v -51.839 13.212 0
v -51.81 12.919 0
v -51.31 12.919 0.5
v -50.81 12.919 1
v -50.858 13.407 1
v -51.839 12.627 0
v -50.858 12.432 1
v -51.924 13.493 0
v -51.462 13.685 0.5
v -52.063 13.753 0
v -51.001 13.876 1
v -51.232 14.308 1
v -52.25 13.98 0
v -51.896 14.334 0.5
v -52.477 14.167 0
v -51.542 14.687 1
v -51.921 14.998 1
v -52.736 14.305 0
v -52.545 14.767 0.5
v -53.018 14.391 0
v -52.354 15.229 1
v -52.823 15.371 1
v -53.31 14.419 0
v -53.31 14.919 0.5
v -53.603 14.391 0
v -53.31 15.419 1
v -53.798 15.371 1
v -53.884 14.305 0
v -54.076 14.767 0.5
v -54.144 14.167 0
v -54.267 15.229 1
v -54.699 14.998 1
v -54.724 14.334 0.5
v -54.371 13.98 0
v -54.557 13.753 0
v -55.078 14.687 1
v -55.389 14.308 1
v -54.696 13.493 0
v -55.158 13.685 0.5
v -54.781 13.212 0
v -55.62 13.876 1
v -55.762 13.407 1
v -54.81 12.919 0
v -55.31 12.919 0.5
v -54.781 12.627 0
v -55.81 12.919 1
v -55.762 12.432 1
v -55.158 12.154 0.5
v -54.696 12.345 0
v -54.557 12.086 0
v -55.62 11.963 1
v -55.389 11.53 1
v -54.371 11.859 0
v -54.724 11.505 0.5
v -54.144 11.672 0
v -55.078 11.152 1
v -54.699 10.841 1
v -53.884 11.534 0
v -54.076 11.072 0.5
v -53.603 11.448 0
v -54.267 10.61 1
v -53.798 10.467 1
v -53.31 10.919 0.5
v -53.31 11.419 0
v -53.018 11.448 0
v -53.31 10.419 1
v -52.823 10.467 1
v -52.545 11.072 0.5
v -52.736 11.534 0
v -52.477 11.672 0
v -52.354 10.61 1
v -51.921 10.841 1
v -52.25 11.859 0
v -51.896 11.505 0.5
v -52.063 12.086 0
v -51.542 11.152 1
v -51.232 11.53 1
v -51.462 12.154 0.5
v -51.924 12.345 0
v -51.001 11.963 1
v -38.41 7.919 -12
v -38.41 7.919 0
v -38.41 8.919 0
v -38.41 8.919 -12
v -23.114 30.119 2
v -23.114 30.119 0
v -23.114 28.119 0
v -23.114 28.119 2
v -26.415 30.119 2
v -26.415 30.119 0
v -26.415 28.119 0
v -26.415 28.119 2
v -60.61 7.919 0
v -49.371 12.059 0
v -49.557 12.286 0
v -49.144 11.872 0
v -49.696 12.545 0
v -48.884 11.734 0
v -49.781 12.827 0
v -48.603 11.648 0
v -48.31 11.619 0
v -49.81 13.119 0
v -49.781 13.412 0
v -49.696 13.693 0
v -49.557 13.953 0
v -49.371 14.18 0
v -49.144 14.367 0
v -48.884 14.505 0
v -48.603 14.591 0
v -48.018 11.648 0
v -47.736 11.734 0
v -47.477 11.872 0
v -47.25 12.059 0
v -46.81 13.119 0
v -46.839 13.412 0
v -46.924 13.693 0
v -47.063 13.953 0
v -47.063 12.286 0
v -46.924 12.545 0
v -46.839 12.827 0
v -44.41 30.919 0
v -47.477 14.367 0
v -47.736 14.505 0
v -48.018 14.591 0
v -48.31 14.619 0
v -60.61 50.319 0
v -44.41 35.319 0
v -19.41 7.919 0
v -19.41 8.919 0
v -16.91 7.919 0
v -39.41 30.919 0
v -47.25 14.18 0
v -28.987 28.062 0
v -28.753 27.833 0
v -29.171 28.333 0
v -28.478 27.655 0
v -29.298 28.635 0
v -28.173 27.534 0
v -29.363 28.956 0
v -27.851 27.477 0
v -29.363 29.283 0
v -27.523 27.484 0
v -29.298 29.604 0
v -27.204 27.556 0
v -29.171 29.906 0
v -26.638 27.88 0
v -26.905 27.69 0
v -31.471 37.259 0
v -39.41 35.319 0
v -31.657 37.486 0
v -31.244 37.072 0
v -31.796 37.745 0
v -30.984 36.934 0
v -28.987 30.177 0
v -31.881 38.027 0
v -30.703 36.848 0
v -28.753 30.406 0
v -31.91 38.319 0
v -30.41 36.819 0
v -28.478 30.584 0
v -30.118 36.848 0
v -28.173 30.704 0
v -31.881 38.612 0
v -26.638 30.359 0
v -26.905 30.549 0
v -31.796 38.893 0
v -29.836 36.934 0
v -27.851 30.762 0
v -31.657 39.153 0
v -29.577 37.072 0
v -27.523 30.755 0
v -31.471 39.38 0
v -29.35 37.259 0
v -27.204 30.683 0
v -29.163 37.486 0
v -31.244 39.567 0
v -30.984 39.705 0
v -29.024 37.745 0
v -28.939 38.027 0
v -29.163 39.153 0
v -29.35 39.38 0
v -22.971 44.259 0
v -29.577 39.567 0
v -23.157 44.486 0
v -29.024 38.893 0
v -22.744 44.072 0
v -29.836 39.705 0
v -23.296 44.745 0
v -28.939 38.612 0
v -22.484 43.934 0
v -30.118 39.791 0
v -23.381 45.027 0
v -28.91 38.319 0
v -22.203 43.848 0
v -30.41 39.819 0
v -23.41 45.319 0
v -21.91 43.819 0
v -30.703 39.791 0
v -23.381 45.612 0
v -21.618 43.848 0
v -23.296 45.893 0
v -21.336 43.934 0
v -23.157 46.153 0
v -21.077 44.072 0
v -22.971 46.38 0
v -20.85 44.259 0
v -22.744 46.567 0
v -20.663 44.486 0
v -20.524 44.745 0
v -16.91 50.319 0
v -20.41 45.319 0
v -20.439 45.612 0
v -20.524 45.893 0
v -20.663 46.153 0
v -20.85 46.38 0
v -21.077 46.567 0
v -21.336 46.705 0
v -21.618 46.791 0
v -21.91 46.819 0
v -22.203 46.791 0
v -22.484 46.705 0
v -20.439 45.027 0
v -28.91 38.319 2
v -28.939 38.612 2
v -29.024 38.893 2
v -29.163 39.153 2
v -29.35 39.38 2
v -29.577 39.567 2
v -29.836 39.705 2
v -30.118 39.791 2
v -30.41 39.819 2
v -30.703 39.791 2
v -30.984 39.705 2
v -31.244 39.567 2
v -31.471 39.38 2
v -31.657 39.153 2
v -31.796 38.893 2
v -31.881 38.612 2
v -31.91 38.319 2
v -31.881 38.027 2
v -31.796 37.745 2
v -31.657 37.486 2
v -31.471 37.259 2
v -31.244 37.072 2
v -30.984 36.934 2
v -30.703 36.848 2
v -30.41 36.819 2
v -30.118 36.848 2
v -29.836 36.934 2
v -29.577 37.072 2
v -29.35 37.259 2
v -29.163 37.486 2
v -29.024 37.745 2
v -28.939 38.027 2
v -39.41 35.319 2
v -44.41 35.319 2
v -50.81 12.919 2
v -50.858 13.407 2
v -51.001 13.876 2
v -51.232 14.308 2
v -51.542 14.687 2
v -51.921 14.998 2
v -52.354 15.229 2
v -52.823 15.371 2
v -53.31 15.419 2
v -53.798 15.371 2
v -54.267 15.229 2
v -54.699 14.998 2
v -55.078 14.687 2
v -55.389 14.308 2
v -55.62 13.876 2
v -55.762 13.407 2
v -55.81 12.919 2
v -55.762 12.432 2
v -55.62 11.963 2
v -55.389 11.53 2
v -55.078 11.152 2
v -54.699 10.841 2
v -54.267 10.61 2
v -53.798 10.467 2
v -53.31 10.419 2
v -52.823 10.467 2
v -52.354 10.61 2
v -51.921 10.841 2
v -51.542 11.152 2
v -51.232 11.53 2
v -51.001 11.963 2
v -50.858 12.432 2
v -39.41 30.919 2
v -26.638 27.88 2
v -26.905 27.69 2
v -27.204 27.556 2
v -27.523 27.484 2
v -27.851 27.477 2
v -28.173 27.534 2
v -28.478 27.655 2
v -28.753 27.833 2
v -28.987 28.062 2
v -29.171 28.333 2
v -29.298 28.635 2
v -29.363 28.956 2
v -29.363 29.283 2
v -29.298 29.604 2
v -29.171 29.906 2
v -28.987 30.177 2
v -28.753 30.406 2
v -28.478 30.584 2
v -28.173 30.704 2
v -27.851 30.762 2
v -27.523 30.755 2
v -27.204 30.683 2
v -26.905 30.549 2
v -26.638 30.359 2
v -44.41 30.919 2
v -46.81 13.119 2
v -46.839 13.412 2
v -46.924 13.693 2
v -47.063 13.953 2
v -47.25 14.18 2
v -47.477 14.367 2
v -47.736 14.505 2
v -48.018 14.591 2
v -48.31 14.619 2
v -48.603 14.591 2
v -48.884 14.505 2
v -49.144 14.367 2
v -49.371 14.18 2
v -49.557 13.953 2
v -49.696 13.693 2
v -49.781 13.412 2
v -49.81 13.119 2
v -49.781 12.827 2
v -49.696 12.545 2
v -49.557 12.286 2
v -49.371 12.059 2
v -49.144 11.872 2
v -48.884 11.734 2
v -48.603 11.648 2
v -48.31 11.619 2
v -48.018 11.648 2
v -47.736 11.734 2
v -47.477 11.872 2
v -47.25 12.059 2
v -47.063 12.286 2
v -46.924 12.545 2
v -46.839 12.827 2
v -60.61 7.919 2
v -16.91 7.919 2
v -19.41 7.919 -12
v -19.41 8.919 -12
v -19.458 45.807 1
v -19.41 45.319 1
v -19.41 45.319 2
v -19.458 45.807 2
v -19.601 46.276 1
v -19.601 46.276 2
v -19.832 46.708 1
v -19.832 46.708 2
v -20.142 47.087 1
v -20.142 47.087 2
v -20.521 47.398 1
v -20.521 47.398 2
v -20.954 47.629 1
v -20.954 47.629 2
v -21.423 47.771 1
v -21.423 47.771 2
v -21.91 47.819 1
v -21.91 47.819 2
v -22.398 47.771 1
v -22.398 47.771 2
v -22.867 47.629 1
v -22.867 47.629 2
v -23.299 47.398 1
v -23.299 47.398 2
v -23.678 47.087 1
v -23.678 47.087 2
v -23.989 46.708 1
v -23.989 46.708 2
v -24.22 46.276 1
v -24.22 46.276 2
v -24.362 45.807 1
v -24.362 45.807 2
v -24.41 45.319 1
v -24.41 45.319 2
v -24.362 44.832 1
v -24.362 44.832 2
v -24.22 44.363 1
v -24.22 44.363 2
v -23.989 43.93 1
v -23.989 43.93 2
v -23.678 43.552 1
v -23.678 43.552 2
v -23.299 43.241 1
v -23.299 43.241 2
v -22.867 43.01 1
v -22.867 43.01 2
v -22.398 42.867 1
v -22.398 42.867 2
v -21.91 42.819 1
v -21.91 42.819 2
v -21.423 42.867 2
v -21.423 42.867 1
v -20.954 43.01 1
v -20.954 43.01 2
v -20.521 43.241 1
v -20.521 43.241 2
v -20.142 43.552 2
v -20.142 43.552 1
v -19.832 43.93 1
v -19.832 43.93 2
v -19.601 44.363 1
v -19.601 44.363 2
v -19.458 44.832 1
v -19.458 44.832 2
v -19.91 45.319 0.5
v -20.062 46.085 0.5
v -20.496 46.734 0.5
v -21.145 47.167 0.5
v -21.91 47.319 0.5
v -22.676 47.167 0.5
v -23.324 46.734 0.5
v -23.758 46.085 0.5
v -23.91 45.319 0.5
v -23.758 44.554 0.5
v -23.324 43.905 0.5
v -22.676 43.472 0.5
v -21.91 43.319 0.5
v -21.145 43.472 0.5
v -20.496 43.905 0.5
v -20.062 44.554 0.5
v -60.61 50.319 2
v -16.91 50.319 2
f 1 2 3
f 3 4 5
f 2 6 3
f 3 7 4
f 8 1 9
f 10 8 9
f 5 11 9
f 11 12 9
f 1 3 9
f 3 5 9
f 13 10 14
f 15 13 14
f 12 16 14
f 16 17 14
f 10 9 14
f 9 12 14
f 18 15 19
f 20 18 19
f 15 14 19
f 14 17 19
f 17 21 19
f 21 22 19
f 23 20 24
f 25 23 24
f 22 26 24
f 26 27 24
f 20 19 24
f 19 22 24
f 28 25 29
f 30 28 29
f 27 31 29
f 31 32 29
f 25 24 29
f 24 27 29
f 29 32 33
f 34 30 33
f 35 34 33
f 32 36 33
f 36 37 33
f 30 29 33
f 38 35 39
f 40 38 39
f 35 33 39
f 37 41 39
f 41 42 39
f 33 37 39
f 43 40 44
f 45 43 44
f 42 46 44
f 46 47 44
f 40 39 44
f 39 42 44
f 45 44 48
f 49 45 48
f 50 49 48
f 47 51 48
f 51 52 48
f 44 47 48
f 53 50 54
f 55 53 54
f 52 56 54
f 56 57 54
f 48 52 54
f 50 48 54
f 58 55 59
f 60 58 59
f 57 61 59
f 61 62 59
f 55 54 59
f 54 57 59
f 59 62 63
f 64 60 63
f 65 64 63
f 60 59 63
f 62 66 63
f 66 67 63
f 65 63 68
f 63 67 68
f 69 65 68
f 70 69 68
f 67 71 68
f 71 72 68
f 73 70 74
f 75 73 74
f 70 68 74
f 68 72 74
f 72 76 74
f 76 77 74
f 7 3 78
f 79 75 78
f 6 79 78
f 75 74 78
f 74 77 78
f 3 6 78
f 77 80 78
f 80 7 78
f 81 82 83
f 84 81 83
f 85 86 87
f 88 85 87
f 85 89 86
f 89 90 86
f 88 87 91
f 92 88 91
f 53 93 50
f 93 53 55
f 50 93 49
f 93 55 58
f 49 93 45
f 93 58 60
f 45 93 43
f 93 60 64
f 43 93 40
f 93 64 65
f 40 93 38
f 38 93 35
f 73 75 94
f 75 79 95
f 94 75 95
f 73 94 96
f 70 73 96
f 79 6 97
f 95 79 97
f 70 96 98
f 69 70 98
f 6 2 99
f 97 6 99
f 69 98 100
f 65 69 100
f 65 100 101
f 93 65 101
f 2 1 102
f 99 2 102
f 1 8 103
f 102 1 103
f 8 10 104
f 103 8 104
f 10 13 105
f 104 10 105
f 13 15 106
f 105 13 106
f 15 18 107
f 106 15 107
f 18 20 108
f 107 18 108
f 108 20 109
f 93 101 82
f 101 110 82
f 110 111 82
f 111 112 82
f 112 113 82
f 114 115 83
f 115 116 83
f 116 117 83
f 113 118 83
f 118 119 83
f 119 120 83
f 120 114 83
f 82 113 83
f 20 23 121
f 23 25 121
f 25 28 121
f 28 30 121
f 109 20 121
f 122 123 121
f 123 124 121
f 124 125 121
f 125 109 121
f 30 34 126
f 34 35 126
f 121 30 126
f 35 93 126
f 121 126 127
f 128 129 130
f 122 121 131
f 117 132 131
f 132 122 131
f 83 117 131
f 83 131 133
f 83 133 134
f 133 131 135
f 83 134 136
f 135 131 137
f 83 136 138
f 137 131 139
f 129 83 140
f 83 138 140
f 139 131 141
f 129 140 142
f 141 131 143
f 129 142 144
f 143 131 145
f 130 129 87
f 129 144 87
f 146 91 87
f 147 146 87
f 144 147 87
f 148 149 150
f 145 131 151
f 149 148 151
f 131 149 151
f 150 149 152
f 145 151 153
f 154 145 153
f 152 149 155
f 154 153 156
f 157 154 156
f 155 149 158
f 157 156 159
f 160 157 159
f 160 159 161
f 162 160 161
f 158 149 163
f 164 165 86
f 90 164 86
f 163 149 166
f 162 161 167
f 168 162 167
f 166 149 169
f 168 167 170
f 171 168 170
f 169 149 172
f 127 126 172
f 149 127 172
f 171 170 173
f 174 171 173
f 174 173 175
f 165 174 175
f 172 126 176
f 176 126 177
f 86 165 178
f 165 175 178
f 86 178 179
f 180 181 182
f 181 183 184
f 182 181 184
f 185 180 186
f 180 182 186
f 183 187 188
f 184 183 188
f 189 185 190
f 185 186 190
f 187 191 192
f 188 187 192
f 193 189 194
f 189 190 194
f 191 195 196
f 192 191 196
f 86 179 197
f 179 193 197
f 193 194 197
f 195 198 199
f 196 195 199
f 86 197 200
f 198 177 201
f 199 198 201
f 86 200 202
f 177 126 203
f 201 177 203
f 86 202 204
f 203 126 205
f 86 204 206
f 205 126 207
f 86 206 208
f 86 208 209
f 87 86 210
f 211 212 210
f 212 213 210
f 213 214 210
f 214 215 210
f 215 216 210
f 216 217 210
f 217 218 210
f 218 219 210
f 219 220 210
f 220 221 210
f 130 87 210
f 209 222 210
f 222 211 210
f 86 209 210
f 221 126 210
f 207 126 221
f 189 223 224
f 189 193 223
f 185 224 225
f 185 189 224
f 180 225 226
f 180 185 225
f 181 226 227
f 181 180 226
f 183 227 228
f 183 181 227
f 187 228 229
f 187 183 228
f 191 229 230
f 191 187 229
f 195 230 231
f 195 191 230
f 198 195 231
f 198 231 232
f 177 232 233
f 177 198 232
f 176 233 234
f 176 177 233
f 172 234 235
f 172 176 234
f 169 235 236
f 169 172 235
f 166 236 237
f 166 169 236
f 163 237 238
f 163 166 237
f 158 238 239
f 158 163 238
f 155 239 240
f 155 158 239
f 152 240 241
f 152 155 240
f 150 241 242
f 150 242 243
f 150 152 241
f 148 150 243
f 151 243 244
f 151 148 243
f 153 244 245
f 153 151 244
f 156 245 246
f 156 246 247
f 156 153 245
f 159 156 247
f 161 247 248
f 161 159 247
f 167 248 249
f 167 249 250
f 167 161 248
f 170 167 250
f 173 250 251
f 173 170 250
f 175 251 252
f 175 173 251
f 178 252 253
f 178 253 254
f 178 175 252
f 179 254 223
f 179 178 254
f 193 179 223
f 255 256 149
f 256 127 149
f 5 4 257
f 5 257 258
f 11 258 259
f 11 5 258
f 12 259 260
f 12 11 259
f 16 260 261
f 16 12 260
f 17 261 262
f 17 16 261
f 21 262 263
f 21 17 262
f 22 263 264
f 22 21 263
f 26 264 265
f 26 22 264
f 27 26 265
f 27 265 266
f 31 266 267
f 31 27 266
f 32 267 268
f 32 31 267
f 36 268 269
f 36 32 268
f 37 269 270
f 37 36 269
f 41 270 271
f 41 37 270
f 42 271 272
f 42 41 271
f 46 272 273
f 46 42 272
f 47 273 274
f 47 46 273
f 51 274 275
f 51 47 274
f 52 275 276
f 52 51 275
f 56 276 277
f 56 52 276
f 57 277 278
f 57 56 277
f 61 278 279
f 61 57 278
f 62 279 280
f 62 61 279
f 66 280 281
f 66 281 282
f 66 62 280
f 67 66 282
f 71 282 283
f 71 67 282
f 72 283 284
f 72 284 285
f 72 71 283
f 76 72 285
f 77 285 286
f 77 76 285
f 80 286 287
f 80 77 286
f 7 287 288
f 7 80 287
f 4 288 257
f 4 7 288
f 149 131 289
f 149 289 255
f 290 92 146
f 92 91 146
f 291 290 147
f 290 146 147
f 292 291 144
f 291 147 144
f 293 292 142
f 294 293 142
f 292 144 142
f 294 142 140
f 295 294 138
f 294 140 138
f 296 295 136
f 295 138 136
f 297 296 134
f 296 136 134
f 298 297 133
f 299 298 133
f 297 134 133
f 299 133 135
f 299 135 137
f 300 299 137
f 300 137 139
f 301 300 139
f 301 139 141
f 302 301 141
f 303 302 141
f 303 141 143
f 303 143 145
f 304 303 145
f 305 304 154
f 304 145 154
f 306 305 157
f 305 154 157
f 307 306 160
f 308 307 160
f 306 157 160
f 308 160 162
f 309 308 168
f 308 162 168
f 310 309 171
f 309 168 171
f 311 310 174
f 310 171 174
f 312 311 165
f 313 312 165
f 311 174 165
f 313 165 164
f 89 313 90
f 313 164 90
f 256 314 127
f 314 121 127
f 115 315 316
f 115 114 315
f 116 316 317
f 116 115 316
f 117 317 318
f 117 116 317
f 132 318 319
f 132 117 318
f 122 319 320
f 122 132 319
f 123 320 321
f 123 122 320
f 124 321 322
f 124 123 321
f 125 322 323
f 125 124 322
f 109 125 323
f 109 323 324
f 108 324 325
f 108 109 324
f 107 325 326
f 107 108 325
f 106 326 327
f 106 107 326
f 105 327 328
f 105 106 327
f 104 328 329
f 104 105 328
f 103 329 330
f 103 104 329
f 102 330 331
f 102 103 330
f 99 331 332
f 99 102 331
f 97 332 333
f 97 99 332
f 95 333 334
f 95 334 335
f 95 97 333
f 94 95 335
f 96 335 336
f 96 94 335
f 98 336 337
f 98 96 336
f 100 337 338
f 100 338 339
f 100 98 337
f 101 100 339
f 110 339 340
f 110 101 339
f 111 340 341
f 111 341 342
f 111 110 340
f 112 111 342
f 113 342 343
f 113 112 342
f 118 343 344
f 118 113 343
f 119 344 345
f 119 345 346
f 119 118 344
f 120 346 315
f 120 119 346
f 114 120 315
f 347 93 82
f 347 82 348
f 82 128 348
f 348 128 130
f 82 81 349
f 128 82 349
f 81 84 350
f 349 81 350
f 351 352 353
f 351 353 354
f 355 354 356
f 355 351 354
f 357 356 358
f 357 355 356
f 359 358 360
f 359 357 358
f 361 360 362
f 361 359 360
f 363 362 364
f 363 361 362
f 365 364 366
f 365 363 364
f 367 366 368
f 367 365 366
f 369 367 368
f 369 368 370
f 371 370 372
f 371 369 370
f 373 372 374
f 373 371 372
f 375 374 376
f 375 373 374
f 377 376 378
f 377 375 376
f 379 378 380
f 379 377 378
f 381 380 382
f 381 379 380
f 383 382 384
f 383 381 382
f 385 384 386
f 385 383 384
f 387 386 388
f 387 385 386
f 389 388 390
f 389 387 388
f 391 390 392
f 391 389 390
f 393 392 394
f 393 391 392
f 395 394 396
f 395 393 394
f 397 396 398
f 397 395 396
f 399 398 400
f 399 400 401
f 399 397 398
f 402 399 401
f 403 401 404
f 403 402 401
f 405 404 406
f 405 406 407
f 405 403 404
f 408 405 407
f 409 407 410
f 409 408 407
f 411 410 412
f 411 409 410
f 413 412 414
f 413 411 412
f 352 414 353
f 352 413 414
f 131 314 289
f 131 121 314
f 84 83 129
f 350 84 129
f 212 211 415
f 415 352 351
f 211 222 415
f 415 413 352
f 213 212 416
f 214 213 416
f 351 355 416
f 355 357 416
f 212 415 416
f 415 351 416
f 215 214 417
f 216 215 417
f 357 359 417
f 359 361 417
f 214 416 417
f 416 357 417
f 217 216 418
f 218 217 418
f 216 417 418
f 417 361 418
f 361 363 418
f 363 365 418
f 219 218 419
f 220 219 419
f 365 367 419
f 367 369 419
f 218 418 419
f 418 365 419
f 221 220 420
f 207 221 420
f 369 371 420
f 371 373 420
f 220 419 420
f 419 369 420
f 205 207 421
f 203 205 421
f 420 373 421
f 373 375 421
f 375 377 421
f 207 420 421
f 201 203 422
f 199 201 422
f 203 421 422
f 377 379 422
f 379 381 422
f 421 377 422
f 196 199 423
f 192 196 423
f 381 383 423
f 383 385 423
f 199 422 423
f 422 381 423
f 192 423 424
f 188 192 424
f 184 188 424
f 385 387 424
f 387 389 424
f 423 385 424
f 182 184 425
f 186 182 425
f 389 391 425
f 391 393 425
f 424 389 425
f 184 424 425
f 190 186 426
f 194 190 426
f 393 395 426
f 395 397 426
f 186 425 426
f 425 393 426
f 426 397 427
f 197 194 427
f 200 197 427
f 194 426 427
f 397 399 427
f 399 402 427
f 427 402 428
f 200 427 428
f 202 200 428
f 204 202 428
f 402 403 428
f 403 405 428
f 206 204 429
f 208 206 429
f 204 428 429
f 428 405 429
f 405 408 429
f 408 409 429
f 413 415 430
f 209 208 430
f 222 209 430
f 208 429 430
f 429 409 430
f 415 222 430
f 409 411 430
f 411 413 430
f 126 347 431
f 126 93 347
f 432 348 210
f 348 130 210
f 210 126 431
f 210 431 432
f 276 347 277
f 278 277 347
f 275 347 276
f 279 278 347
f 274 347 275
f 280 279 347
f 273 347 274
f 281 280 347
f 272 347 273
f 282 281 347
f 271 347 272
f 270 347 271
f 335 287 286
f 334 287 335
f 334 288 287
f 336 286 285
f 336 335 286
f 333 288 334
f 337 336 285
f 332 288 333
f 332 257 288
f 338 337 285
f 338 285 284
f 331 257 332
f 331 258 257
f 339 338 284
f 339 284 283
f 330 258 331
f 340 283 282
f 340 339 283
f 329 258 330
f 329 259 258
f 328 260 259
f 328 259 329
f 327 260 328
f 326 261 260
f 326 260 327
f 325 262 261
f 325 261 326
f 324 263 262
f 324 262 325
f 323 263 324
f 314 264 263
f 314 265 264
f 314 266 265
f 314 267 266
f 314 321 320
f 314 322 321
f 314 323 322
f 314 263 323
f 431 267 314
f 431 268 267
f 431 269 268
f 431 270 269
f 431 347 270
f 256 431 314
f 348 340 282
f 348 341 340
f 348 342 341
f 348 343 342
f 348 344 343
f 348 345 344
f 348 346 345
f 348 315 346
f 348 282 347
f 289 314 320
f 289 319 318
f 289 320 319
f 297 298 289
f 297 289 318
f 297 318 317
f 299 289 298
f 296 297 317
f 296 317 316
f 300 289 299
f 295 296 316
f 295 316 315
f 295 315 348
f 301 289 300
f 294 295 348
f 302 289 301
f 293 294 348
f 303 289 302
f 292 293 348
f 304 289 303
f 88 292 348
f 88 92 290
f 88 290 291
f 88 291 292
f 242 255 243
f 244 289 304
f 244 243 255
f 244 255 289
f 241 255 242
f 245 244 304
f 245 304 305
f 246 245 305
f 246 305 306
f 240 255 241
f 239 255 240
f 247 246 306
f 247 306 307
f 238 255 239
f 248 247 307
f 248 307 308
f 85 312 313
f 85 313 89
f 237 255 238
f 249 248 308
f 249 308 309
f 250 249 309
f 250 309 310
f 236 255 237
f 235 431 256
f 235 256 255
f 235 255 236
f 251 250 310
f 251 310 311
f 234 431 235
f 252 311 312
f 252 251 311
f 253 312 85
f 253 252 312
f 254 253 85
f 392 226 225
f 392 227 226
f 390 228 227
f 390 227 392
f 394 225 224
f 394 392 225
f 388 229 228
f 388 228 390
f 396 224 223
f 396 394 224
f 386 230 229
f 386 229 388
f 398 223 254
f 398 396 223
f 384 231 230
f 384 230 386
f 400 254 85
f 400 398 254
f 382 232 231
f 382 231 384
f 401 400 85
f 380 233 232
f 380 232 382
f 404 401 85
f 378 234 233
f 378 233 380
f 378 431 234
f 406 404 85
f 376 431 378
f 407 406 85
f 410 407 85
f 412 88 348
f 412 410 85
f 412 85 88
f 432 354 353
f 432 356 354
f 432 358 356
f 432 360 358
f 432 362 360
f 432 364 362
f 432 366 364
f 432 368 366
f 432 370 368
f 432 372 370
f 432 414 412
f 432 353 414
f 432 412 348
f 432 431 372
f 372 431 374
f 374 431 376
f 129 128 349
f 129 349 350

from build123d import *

# Parameters (mm, degrees)
F1_W     = 43.7
F1_H     = 42.4
F1_R     = 1.5
F1_W_2   = 5
F1_H_2   = 4.4
F2_DEPTH = 1
F3_SIZE  = 0.99999
F4_DEPTH = 1
F5_W     = 19
F5_H     = 1
F6_DEPTH = 12


# Not quite as in the source:
# - a fillet or chamfer is up to 0.001 mm smaller than in the source, because OpenCascade refuses the exact size


with BuildPart() as f2:
    # F1 (on face) → F2 (new body)
    with BuildSketch(Plane.XY):
        with Locations((-38.7602308843, 29.1194021702)):
            Rectangle(F1_W, F1_H)
        with Locations((-53.3102308843, 12.9194021702)):
            Circle(F1_R, mode=Mode.SUBTRACT)
        with Locations((-48.3102308843, 13.1194021702)):
            Circle(F1_R, mode=Mode.SUBTRACT)
        with Locations((-41.9102308843, 33.1194021702)):
            Rectangle(F1_W_2, F1_H_2, mode=Mode.SUBTRACT)
        with Locations((-30.4102308843, 38.3194021702)):
            Circle(F1_R, mode=Mode.SUBTRACT)
        with BuildLine():
            ThreePointArc((-26.4145926142, 28.1194021702), (-29.3713070947, 29.1194021702), (-26.4145926142, 30.1194021702))
            Line((-26.4145926142, 30.1194021702), (-23.1138560921, 30.1194021702))
            Line((-23.1138560921, 30.1194021702), (-23.1138560921, 28.1194021702))
            Line((-23.1138560921, 28.1194021702), (-26.4145926142, 28.1194021702))
        make_face(mode=Mode.SUBTRACT)
        with Locations((-21.9102308843, 45.3194021702)):
            Circle(F1_R, mode=Mode.SUBTRACT)
    extrude(amount=F2_DEPTH)

    # F3 (size 1 in the source; OpenCascade refuses exactly that, so slightly less here)
    f3_edges = [f2.edges().sort_by_distance(p)[0] for p in [
        (-23.410231, 45.319402, 1),
        (-54.810231, 12.919402, 1),
    ]]
    chamfer(f3_edges, length=F3_SIZE)

    # F4 (add): a face of the model
    f4_faces = [f2.faces().sort_by_distance(p)[0] for p in [
        (-38.8442562914, 29.0967487251, 1),
    ]]
    extrude(f4_faces, amount=F4_DEPTH)

    # F5 (on face) → F6 (join)
    with BuildSketch(Plane.XY):
        with Locations((-28.9102308843, 8.4194021702)):
            Rectangle(F5_W, F5_H)
    extrude(amount=-F6_DEPTH)


solid = f2.part
